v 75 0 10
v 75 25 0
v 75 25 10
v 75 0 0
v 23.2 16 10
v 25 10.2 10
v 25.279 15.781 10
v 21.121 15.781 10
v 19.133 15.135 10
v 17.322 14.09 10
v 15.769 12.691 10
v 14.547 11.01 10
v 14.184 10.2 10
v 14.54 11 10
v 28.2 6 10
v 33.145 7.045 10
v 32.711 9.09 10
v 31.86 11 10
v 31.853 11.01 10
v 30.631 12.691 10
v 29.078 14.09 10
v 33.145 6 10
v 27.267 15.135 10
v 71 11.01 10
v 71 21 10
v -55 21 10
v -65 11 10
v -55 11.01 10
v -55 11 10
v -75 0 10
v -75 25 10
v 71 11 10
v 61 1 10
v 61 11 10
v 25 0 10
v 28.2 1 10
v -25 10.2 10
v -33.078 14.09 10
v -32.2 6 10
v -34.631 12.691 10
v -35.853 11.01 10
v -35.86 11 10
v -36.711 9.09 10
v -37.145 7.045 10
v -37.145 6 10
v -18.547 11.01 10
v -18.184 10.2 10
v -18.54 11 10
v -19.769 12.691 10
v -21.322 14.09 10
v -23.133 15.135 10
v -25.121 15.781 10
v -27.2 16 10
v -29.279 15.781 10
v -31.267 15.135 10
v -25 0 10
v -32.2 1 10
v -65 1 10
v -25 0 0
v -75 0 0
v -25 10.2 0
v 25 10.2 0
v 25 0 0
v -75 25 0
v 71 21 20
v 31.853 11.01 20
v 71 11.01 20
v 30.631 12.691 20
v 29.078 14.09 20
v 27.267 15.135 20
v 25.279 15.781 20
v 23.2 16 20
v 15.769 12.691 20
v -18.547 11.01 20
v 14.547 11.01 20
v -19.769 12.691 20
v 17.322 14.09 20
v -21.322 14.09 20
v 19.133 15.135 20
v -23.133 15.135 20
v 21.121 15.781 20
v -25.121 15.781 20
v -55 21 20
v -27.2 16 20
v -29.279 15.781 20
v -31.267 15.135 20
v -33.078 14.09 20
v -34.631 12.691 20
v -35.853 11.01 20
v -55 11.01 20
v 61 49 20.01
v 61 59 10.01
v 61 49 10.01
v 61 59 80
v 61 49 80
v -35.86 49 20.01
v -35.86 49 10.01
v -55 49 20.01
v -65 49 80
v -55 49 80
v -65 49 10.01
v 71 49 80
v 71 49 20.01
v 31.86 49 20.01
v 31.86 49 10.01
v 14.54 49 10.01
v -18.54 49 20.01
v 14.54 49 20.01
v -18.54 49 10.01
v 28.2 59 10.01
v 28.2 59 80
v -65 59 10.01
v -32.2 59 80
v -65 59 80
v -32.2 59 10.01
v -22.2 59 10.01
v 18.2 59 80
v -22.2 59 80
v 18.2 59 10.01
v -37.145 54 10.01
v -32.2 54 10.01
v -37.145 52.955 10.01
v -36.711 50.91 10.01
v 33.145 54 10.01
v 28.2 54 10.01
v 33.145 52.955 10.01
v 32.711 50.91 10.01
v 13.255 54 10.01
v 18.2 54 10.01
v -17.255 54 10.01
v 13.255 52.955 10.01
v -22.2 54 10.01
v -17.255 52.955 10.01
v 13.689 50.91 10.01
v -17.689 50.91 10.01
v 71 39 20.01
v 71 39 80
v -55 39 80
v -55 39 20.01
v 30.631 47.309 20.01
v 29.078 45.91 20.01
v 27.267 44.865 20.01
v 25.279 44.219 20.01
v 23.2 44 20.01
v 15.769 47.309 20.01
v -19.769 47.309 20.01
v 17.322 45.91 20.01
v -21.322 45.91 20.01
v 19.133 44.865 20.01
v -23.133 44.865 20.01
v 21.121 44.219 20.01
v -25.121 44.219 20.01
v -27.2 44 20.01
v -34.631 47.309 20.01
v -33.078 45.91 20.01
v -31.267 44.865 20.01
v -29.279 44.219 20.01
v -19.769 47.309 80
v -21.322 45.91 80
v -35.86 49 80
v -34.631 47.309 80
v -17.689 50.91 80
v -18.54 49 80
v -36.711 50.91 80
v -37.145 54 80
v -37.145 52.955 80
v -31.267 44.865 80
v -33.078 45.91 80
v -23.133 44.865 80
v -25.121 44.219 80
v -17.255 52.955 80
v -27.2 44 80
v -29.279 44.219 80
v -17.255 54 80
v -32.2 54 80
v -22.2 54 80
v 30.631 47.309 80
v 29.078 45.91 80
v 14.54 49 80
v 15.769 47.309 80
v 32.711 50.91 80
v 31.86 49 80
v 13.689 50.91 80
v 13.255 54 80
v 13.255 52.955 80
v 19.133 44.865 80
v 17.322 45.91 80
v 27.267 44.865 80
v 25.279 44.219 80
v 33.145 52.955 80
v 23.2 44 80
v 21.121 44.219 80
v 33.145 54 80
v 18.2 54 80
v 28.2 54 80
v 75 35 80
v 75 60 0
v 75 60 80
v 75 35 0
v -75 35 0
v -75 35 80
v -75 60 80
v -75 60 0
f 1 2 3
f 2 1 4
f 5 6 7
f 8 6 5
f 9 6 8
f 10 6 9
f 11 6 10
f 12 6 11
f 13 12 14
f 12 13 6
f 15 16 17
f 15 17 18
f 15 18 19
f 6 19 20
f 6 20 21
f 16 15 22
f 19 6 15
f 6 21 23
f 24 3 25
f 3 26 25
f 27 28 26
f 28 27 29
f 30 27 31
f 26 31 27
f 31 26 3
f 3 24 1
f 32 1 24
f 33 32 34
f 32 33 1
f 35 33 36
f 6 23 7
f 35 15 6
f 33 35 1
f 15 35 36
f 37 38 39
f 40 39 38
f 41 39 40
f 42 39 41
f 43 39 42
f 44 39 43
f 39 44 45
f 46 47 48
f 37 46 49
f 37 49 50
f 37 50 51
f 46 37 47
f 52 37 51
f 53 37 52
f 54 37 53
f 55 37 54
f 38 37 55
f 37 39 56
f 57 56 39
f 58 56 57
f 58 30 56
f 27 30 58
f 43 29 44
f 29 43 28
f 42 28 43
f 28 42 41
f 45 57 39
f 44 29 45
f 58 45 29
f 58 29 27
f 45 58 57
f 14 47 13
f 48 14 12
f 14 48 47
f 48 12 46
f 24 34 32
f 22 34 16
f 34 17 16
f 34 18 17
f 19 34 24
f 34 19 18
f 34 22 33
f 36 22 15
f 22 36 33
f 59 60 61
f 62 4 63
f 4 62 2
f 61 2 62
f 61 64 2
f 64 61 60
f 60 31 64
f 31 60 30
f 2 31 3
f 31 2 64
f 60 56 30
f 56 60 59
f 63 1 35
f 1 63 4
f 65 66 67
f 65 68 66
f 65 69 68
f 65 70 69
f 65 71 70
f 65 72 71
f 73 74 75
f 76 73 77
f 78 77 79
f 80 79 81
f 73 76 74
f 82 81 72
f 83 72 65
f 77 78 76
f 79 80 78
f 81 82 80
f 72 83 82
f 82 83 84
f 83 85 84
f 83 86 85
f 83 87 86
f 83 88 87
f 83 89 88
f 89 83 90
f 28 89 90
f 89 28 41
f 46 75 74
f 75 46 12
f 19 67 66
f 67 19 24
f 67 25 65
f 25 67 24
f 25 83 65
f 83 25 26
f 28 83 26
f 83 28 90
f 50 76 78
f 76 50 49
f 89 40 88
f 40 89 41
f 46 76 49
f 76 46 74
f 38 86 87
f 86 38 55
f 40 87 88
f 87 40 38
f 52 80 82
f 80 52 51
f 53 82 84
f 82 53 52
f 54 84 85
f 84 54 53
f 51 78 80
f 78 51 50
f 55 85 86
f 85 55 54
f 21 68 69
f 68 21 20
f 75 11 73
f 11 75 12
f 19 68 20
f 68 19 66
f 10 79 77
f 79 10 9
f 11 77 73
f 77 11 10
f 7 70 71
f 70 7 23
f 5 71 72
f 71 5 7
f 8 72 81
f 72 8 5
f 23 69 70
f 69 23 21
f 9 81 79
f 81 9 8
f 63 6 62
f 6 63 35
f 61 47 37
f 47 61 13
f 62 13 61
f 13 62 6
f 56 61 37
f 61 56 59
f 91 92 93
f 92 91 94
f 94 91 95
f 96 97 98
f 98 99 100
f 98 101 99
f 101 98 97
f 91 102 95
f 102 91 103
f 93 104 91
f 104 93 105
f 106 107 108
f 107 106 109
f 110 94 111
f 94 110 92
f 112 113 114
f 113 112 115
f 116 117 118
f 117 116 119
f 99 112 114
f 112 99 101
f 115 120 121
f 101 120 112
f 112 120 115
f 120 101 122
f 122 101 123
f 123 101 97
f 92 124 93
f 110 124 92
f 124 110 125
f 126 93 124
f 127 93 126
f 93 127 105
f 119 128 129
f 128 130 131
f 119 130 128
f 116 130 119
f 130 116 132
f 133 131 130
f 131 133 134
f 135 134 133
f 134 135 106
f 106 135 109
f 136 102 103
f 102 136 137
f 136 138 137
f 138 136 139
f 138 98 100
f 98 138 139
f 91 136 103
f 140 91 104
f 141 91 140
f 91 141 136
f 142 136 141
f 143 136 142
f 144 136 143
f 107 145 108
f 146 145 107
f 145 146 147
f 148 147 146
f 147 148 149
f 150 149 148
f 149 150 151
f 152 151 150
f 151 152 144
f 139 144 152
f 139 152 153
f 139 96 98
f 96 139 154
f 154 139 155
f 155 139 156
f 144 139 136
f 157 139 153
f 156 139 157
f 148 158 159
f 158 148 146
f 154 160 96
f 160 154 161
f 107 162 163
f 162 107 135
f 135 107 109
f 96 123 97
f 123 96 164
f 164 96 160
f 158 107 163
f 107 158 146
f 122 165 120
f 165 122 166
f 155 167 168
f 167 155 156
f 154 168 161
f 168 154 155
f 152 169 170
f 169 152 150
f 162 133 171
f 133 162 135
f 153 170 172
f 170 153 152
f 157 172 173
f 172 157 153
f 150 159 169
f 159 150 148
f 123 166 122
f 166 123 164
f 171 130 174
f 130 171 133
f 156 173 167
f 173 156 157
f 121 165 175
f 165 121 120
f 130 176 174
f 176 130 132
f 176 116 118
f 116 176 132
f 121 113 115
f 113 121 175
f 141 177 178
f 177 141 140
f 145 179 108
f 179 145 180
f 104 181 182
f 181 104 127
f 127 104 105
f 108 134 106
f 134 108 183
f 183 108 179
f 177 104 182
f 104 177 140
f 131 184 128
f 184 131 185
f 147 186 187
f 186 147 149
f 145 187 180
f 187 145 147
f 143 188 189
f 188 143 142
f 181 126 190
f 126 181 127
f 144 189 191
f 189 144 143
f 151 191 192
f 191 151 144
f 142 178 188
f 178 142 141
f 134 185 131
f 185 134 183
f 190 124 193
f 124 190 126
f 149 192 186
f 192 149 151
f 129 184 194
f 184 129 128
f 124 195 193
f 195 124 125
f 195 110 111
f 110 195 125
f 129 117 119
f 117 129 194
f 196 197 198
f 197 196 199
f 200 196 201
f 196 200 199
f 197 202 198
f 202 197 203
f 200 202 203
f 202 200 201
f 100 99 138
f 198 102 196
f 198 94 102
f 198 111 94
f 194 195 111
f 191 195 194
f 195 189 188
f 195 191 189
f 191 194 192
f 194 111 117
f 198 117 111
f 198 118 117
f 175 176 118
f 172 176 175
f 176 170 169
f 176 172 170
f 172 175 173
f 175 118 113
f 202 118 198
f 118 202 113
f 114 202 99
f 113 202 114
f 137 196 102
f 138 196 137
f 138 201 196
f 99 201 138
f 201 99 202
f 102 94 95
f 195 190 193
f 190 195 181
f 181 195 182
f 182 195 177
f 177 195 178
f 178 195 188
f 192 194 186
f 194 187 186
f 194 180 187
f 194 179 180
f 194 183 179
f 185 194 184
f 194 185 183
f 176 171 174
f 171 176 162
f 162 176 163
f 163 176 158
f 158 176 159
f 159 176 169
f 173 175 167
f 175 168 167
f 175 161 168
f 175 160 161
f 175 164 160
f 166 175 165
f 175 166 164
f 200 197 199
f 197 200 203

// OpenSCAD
// file: fullbrick.scad
module ckey(theh)
{
        halfcylinder(theh);
        translate([5,0,0]) rotate([-90,90,0]) cube([10,10,theh]);
}

module halfcylinder(theh)
{
      difference(){
        rotate([-90,90,0]) cylinder(h=theh,r=10);
        rotate([-90,90,0]) translate([0,-10,-1]) cube([20,20,theh+2]);
      }
}



module basebrick(bh,bl)
{
    cube([bl,bh,10]);
    translate([10,10,10]) cube([bl,bh,10]);
}

module brick(bl,bh)
{   
    difference(){
        basebrick(bh,bl);
        translate([bl*.30,-10,5]) ckey(160);
        translate([bl*.70,-10,5]) ckey(160);
        }
    
}

brick(125,60);
// main file
use <fullbrick.scad>;

module thebody()
{
    difference(){
        cube([150,80,25]);
        translate([10,10.01,1]) brick(126,60);
        translate([10,80-10,1]) brick(126,60);
    }
}

module cap_part()
{
    translate([0,-30,0]) cube([150,25,10]);
    translate([0,-30+10.01+1,10]) cube([150,10,10]);
   
}
module thecap()
{
     difference(){
       translate([0,80+10,30]) rotate([90,0,0]) cap_part();
       translate([0,0,0]) thebody();
       translate([50,80-2,0]) cube([50,40,10.2]);
     }
     //translate([0,-30,0]) cube([150,30,25]);
     //difference(){
     //   translate([10,0,1]) brick(126,60);
     //   translate([10,5,1]) brick(126,60);  
    // }
}

module full_mold()
{
translate([0,100-10,0]) rotate([180,0,0]) thecap();
translate([0,0,-60]) thebody();
}

translate([-75,0,0]) rotate([90,0,0]) full_mold();
